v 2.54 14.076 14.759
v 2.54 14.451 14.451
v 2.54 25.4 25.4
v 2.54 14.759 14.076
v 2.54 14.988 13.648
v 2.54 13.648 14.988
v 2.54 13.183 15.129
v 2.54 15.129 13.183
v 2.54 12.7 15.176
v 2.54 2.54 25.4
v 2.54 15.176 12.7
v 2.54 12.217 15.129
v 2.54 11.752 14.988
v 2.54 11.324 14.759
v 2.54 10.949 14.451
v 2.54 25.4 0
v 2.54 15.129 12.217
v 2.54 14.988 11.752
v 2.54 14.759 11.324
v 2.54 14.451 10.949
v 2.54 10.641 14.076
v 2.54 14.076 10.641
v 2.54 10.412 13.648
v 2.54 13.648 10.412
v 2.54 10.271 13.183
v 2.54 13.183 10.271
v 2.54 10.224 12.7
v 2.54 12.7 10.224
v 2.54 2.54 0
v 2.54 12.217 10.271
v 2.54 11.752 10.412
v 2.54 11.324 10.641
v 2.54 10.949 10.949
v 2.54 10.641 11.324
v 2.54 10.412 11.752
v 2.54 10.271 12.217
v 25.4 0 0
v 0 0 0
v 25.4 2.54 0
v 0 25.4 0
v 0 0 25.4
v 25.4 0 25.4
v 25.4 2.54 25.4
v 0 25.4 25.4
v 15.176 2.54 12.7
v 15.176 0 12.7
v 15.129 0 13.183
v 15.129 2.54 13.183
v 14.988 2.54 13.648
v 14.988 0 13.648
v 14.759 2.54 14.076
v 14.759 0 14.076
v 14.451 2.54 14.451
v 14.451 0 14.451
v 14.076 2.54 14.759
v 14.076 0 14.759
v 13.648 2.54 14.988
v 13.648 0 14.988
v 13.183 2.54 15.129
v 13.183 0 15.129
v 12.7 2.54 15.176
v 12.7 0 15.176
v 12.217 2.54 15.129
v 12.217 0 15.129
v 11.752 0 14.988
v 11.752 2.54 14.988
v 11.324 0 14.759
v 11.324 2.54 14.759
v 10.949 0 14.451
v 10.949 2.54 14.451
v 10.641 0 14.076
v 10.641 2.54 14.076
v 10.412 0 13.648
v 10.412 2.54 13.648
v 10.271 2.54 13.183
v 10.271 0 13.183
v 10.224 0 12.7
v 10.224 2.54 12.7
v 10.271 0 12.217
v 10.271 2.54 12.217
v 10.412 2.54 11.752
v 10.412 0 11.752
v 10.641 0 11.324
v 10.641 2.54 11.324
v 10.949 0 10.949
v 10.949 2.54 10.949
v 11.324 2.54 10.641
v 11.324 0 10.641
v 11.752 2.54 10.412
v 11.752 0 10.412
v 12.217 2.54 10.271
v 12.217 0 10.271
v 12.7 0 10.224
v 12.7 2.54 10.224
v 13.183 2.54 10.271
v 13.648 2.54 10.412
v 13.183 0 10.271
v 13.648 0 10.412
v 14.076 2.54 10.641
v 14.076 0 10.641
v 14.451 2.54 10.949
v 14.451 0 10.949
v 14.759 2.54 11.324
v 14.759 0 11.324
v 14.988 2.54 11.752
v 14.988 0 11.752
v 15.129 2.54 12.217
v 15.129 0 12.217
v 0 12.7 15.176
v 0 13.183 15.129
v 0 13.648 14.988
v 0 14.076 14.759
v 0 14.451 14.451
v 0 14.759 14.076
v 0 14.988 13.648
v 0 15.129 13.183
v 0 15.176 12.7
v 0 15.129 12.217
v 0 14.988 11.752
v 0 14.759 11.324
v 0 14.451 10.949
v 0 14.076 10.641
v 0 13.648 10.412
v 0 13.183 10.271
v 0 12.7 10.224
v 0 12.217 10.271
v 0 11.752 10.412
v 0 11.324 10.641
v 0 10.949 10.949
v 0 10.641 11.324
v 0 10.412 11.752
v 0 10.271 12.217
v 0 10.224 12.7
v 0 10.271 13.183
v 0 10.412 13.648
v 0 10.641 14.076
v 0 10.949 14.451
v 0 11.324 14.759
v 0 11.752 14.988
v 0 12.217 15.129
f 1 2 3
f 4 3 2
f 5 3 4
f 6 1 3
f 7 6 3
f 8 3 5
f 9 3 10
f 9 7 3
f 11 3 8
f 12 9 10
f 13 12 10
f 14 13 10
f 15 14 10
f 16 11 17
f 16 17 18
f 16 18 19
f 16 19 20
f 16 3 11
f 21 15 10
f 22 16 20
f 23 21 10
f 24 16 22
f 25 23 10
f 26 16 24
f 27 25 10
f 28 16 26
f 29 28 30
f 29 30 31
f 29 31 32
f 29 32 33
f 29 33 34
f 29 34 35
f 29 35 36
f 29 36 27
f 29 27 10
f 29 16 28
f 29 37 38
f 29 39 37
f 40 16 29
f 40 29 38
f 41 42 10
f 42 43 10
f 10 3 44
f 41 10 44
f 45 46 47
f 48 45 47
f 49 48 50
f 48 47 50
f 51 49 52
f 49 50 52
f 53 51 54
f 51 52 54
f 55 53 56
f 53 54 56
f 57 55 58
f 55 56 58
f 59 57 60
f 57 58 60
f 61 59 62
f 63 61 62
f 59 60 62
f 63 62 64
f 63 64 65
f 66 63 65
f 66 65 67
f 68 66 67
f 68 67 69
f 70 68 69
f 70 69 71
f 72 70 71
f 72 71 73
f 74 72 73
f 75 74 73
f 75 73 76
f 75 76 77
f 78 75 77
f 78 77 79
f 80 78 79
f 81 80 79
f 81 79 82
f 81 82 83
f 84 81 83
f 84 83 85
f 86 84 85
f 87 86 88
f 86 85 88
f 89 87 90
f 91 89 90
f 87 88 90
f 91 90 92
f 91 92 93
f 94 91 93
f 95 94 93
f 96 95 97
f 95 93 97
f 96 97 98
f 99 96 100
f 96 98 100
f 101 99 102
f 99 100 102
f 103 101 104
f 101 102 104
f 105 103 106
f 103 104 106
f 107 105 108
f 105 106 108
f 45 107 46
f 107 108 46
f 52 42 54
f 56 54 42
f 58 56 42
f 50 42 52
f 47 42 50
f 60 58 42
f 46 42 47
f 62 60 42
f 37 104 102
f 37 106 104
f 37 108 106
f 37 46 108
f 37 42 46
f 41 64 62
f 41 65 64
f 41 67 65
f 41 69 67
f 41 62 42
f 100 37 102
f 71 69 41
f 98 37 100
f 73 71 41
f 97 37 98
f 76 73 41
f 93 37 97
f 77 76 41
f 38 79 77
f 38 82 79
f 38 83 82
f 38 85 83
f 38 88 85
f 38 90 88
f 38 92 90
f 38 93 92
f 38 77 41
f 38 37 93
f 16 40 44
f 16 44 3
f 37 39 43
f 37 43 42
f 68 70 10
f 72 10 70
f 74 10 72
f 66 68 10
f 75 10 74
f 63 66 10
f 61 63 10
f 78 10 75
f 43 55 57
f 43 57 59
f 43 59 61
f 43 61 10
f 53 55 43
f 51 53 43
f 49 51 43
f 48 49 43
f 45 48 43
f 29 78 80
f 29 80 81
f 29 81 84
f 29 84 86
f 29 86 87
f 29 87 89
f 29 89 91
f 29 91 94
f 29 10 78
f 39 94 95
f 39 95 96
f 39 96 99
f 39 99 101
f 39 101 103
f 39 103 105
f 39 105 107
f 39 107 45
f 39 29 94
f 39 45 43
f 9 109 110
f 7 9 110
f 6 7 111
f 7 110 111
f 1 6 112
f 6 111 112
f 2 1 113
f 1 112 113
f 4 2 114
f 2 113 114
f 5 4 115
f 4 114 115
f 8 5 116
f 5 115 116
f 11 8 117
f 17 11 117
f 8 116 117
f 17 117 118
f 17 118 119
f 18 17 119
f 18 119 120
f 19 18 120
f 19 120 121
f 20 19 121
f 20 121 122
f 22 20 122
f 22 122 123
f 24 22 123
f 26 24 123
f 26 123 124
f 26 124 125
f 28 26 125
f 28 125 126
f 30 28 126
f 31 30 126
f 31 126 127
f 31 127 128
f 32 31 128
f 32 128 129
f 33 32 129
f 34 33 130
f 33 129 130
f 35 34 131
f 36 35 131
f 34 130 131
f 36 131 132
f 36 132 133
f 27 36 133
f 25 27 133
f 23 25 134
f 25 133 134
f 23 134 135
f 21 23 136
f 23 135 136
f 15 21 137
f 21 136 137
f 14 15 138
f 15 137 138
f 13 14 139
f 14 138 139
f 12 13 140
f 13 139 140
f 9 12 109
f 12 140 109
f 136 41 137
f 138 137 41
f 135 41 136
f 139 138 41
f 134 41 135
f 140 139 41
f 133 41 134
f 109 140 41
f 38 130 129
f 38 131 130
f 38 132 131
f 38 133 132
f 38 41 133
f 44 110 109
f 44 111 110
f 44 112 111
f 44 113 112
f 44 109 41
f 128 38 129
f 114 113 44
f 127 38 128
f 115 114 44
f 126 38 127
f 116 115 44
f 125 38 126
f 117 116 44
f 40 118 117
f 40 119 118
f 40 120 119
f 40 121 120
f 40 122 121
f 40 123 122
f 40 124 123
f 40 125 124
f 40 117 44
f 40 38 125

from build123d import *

# Parameters (mm, degrees)
EXTRUDE_THIN1_DEPTH = 25.4
SKETCH3_R           = 2.4765
CUT_EXTRUDE1_DEPTH  = 26.4
SKETCH4_R           = 2.4765
CUT_EXTRUDE2_DEPTH  = 26.4


with BuildPart() as part:
    # Sketch1 → Extrude-Thin1 (new body)
    with BuildSketch(Plane.XY):
        Polygon((25.4, 0), (0, 0), (0, 25.4), (2.54, 25.4), (2.54, 2.54), (25.4, 2.54), align=None)
    extrude(amount=EXTRUDE_THIN1_DEPTH)

    # Sketch3 → Cut-Extrude1 (cut, through all)
    with BuildSketch(Plane.ZY):
        with Locations((12.7, 12.7)):
            Circle(SKETCH3_R)
    extrude(amount=-CUT_EXTRUDE1_DEPTH, mode=Mode.SUBTRACT)

    # Sketch4 → Cut-Extrude2 (cut, through all)
    with BuildSketch(Plane.XZ):
        with Locations((12.7, 12.7)):
            Circle(SKETCH4_R)
    extrude(amount=-CUT_EXTRUDE2_DEPTH, mode=Mode.SUBTRACT)


solid = part.part
